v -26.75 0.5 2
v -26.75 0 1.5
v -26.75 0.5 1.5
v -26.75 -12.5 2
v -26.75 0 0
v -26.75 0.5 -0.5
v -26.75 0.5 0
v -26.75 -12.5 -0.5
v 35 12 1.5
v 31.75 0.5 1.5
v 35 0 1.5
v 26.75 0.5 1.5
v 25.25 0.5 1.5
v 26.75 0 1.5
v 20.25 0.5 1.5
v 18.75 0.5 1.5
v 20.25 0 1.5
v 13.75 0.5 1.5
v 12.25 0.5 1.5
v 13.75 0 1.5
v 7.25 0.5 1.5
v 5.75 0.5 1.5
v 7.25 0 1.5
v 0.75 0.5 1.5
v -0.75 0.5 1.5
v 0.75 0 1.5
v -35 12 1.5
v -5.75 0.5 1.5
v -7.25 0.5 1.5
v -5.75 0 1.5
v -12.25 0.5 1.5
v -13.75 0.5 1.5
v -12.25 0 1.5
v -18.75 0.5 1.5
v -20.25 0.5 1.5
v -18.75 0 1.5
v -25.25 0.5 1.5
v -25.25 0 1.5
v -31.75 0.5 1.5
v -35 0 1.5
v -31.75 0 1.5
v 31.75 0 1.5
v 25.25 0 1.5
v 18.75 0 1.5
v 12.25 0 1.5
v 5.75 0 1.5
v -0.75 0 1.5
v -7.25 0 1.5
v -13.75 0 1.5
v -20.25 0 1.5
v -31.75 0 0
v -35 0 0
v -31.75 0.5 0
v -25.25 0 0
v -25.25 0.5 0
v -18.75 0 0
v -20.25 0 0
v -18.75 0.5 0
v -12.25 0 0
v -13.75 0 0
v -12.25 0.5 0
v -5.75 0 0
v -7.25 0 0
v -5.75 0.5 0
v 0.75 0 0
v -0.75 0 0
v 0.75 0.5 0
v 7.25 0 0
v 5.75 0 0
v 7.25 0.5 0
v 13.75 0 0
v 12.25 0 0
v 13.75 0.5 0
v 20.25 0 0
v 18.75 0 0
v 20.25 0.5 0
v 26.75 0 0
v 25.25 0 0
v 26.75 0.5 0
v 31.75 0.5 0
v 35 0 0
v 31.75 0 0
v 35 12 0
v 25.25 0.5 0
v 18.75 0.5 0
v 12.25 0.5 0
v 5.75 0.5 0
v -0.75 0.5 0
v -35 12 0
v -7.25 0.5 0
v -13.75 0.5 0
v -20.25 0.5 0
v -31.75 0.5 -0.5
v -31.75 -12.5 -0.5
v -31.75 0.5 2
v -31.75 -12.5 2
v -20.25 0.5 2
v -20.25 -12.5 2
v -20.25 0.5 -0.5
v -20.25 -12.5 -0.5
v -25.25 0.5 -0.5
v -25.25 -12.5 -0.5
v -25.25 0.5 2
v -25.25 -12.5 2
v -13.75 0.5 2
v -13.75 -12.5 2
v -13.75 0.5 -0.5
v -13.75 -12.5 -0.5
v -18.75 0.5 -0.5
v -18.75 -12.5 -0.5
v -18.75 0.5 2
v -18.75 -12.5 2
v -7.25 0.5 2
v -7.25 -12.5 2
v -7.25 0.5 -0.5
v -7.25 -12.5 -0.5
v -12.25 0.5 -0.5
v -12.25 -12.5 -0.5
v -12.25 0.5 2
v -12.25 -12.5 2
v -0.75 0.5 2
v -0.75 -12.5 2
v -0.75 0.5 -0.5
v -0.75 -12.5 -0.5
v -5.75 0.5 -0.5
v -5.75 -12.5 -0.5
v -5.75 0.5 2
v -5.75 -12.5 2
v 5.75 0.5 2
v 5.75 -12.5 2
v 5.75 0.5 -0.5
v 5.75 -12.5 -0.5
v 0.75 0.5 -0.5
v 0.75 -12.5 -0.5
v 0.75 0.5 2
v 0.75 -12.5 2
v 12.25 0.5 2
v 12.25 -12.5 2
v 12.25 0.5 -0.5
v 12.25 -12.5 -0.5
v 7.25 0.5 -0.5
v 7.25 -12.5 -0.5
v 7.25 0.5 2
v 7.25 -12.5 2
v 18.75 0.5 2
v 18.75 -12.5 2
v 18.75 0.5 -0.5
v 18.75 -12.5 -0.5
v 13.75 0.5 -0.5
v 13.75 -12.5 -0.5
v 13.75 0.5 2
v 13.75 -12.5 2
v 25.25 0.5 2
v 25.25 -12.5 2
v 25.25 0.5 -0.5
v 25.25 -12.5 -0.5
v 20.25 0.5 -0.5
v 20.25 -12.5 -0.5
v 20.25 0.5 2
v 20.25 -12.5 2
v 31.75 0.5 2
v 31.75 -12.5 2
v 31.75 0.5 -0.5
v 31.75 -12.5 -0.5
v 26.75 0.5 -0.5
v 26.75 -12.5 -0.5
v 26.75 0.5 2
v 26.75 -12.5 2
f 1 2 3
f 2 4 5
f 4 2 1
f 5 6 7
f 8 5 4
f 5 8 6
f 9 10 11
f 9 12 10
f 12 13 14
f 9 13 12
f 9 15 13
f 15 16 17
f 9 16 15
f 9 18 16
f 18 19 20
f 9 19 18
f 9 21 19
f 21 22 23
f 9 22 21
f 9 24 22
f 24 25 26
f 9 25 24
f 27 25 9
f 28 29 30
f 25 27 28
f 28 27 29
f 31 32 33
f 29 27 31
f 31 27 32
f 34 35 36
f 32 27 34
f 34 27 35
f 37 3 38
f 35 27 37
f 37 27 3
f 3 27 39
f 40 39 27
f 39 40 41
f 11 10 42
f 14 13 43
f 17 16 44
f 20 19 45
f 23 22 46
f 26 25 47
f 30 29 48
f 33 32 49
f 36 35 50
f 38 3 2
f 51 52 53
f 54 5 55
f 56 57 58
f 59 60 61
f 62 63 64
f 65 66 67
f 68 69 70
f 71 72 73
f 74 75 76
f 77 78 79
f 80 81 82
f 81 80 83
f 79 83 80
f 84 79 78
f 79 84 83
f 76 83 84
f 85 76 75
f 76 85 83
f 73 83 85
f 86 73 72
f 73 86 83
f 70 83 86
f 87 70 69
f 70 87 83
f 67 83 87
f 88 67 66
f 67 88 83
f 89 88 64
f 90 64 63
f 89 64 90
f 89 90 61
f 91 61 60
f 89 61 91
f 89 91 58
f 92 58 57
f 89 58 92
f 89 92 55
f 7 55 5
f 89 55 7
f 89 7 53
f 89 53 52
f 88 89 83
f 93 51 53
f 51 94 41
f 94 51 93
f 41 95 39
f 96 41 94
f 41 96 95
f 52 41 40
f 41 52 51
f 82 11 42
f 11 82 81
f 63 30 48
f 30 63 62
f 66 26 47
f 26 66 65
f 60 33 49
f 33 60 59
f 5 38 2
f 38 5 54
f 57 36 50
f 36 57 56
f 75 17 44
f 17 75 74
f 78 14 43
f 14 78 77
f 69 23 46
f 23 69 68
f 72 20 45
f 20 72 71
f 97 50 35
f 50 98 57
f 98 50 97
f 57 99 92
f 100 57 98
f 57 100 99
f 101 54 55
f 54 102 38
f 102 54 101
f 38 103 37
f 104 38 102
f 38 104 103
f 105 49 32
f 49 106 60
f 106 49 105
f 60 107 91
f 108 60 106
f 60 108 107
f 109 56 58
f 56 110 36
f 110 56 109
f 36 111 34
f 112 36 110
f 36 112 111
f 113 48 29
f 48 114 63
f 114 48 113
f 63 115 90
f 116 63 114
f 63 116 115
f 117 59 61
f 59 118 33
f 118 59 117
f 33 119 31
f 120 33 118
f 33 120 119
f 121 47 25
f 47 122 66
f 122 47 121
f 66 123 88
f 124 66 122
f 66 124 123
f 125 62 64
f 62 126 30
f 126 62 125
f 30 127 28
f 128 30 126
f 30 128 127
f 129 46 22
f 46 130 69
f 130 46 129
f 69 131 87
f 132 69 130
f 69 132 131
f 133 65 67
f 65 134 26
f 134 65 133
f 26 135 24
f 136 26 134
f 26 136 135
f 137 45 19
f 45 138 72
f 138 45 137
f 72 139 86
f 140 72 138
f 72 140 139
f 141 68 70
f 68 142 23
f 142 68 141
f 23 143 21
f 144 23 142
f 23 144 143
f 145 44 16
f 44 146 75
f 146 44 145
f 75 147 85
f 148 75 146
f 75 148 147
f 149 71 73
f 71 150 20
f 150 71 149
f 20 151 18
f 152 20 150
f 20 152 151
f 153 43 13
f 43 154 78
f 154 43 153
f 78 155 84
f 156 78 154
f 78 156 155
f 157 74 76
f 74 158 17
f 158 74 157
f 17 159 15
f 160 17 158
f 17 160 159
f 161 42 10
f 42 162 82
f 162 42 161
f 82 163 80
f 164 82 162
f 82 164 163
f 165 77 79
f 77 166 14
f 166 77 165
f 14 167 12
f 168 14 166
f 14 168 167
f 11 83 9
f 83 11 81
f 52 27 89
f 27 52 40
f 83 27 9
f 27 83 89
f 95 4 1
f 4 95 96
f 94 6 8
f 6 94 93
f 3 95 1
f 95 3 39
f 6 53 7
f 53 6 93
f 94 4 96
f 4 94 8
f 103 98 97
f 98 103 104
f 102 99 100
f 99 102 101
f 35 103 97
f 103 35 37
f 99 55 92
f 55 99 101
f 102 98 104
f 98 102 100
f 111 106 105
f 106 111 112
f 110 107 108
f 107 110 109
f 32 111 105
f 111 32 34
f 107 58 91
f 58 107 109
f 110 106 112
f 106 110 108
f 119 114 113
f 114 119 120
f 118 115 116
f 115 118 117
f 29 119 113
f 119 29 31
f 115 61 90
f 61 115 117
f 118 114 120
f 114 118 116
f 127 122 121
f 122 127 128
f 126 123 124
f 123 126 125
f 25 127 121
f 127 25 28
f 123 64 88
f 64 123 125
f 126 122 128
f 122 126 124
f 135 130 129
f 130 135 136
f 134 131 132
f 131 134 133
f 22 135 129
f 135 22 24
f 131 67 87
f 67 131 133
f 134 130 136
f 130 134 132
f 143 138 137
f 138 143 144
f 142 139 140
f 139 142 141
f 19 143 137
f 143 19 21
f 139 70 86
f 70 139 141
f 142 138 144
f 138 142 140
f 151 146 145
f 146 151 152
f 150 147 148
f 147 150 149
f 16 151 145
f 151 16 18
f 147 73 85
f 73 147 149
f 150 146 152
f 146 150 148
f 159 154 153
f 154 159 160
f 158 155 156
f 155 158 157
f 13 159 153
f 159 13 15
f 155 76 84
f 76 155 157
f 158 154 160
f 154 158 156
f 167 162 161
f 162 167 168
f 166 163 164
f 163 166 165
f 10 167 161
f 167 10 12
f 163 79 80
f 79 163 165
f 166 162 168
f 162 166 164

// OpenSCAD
// 10-well comb for casting agarose gels
// Print orientation: flat on bed, spine (back bar) along +X, teeth hanging in -Y

// ---------- Parameters ----------
spine_len   = 70;    // spine length along X (mm)
spine_wid   = 12;    // spine width along Y (mm)
plate_thk   = 1.5;   // comb plate thickness along Z (mm)

tooth_count = 10;    // number of teeth
tooth_w     = 5.0;   // tooth width along X (mm)
tooth_l     = 12;    // tooth length along Y (mm)
tooth_gap   = 1.5;   // gap between neighbouring teeth (mm)

eps         = 0.5;   // cutter overshoot past faces (mm)

$fn = 64;

// ---------- Derived ----------
pitch   = tooth_w + tooth_gap;              // centre-to-centre spacing
x_start = -(tooth_count - 1) * pitch / 2;   // first tooth centre (row centred on spine)

// ---------- Model ----------
union() {
    // Spine (back bar)
    translate([-spine_len / 2, 0, 0])
        cube([spine_len, spine_wid, plate_thk]);

    // Teeth
    for (i = [0 : tooth_count - 1])
        translate([x_start + i * pitch - tooth_w / 2, -tooth_l, 0])
            cube([tooth_w, tooth_l, plate_thk]);
}

// ---------- Cut the wells ----------
difference() {
    // (Optional: model the comb as above, then cut)
    // Here we cut directly through the plate thickness.
    for (i = [0 : tooth_count - 1])
        translate([x_start + i * pitch - tooth_w / 2, -tooth_l - eps, -eps])
            cube([tooth_w, tooth_l + 2 * eps, plate_thk + 2 * eps]);
}
